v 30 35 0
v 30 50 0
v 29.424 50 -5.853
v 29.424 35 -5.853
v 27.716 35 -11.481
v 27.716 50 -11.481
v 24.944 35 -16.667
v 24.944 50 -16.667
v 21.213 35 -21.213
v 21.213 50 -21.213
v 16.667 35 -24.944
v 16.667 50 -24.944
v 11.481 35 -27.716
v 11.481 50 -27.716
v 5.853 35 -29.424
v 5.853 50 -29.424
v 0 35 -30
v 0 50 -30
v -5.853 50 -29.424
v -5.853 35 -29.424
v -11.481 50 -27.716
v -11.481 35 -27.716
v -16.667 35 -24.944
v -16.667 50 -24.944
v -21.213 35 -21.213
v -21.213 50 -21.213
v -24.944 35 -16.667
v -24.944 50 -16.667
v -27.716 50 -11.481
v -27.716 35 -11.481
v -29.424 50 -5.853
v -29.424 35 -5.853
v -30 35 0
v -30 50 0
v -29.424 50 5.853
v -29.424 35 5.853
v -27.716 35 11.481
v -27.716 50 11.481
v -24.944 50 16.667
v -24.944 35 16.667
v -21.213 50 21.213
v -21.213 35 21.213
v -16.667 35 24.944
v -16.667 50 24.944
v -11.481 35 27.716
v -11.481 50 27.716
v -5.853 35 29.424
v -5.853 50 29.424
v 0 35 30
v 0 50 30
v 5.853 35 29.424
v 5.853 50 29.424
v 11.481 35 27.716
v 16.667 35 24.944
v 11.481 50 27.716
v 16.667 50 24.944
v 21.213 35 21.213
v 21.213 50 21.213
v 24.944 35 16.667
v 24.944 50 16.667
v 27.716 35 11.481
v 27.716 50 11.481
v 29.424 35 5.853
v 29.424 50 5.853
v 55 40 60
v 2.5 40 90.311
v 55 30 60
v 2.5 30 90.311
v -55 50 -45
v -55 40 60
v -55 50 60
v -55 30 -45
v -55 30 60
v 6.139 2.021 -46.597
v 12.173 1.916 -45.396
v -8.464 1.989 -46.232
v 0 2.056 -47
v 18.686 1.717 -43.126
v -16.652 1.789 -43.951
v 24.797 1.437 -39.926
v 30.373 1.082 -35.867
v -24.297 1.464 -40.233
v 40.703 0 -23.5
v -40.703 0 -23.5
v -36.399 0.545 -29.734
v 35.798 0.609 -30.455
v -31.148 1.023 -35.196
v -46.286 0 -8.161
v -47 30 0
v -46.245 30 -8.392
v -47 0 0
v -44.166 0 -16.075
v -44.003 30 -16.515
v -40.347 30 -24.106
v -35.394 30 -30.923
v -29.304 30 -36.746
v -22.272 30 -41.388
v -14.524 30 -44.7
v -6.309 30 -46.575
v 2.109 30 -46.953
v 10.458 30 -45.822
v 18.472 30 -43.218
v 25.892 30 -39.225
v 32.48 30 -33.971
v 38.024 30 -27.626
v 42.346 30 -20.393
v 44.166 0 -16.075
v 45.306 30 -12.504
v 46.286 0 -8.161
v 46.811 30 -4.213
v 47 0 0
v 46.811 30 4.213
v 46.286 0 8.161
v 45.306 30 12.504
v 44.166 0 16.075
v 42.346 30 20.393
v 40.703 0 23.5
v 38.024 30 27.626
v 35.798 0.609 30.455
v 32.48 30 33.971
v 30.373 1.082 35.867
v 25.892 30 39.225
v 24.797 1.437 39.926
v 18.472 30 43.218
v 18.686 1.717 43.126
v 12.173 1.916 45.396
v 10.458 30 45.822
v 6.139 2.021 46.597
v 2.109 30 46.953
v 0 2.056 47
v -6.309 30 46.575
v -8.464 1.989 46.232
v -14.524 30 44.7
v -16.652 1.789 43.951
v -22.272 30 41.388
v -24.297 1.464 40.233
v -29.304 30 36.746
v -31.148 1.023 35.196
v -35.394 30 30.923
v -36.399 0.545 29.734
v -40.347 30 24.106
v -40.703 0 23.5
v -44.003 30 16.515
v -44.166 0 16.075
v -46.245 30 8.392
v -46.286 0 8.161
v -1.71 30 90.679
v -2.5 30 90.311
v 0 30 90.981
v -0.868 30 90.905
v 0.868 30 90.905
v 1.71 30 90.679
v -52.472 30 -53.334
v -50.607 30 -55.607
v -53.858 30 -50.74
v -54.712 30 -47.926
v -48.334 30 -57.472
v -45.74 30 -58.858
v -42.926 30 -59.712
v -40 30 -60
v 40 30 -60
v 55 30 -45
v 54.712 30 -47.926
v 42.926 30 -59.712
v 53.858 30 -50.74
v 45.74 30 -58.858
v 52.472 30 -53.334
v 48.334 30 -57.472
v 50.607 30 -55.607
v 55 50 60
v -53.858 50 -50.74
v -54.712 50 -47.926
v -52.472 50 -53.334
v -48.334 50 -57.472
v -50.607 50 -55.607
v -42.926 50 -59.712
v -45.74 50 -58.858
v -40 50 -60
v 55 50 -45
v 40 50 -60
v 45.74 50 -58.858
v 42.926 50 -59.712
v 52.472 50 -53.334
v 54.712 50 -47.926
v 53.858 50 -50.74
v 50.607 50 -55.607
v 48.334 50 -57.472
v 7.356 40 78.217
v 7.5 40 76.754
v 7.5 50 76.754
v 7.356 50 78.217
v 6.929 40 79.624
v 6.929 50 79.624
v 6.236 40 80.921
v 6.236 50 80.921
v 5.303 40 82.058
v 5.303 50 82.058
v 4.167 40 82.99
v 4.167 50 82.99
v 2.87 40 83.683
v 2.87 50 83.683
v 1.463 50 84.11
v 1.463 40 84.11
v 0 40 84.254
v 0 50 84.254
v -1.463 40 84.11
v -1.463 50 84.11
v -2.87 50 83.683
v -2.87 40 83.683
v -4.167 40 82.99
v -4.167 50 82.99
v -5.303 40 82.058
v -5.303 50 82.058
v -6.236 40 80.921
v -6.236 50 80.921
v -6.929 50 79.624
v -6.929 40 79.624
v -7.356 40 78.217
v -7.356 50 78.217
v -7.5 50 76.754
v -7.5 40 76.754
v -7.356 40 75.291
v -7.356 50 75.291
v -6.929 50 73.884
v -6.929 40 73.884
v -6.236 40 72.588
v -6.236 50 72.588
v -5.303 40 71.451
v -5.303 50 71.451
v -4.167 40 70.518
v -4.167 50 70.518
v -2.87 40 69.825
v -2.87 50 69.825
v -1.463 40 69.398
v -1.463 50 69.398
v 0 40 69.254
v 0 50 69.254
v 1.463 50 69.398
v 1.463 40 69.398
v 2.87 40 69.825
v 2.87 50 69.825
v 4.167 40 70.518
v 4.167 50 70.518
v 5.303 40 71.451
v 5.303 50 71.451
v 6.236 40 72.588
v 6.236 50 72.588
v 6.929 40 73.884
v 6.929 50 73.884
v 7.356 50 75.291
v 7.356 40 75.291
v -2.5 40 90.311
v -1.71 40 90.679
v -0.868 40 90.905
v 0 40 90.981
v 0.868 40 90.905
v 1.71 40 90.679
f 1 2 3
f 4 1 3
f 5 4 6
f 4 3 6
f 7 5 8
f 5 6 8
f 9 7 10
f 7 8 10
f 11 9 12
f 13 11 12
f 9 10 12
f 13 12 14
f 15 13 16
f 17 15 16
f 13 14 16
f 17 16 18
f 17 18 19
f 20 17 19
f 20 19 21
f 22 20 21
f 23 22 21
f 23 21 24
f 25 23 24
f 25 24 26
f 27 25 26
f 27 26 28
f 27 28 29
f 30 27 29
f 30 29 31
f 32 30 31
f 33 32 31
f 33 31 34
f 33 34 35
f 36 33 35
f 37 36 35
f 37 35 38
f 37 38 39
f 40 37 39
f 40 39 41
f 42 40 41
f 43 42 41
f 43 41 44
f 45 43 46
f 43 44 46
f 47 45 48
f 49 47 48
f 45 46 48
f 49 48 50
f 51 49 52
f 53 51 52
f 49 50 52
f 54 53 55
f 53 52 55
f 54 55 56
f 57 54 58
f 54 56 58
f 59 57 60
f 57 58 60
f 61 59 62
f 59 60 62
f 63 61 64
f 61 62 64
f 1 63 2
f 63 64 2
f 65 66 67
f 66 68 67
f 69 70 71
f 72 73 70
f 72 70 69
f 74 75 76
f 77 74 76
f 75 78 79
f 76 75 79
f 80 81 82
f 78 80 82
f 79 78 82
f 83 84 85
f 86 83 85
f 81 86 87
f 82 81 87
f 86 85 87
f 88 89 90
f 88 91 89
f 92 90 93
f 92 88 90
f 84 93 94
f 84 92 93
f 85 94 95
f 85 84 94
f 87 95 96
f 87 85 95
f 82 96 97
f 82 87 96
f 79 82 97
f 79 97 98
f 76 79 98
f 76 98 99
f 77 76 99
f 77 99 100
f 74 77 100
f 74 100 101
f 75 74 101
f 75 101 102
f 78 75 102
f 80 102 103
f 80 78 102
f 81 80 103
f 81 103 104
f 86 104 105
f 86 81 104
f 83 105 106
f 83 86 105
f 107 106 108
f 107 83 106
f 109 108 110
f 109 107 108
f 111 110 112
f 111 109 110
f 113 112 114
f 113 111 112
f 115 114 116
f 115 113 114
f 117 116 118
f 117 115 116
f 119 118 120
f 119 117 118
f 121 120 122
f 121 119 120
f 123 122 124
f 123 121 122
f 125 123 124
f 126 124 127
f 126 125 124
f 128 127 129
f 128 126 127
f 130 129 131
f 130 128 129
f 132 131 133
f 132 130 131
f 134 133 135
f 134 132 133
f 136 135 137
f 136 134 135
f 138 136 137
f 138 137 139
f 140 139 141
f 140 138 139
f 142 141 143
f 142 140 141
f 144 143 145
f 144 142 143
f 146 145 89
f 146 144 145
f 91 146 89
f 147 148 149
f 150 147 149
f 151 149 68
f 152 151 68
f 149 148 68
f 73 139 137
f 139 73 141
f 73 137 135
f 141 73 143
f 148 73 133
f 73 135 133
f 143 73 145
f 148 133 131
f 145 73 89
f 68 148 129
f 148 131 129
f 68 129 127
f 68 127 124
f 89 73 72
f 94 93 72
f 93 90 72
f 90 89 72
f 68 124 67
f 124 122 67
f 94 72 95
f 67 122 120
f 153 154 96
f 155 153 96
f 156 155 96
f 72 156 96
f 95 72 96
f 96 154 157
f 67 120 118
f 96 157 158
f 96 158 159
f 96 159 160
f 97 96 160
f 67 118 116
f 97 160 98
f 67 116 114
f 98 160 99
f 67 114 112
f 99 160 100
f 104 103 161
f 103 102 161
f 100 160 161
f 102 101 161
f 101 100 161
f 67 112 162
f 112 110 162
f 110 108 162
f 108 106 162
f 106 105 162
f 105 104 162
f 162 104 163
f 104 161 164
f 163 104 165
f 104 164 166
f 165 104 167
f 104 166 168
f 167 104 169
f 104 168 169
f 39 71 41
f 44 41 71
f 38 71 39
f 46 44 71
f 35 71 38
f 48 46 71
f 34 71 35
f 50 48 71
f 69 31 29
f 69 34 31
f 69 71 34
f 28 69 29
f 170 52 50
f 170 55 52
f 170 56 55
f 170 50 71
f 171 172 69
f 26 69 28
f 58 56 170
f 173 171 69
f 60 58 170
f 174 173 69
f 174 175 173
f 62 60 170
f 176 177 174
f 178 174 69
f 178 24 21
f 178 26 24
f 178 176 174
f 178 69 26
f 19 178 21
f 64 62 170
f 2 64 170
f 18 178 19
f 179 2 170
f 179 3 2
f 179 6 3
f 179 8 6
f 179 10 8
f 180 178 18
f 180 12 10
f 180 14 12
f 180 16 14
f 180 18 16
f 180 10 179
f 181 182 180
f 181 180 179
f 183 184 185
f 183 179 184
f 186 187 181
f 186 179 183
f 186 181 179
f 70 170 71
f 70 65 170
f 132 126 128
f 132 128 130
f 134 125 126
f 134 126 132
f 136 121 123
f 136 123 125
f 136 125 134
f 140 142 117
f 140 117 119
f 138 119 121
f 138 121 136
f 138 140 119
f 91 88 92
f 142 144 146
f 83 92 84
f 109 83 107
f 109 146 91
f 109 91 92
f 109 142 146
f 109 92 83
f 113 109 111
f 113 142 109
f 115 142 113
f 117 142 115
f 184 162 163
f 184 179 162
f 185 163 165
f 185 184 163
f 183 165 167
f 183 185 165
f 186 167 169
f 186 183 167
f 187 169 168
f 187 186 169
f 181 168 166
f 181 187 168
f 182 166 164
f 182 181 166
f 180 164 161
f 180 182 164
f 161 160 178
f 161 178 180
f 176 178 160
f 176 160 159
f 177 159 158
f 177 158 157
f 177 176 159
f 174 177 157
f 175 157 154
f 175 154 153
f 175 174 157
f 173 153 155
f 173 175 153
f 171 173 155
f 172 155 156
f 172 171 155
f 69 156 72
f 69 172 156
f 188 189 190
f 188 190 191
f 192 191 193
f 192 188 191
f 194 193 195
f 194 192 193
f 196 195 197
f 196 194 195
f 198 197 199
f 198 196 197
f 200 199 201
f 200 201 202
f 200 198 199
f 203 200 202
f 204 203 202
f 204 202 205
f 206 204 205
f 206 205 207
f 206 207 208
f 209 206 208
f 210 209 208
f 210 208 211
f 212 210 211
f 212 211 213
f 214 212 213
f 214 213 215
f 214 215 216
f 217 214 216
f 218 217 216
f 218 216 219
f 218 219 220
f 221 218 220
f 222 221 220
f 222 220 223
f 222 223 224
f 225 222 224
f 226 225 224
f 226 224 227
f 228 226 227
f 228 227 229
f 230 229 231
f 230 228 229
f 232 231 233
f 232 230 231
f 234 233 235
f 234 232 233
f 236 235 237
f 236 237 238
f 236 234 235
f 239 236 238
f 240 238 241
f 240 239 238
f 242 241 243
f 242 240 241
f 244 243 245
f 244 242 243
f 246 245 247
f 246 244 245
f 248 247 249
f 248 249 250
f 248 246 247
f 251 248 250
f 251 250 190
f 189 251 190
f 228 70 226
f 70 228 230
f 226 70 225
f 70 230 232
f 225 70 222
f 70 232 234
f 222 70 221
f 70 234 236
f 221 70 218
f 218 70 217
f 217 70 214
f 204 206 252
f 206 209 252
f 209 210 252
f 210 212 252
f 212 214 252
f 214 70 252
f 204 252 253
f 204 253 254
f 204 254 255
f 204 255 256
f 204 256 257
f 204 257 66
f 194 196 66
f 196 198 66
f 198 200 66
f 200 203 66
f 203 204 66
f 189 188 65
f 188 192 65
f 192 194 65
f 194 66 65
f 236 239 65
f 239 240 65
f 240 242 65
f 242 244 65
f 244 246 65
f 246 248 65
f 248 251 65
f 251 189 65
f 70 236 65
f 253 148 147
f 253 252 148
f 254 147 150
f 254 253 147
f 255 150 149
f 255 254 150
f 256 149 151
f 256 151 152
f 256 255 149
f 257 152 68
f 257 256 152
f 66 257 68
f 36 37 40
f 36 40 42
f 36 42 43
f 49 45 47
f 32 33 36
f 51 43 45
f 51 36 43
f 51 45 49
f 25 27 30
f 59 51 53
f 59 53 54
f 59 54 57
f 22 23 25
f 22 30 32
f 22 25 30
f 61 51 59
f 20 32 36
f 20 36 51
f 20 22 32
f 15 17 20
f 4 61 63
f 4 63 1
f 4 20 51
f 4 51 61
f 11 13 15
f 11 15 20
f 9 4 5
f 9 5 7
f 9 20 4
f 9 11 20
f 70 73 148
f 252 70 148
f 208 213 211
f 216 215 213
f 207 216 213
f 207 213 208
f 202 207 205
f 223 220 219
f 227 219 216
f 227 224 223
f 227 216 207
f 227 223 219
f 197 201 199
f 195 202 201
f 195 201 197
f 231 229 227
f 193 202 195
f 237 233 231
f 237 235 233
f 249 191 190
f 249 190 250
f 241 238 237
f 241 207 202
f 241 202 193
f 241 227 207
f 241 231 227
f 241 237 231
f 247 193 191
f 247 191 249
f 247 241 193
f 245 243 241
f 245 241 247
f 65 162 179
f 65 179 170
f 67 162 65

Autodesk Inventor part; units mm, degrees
ref_plane "YZ Plane" through (0, 0, 0) normal (1, 0, 0) x (0, 1, 0)
ref_plane "XZ Plane" through (0, 0, 0) normal (0, 1, 0) x (-1, 0, 0)
sketch "스케치1" plane through (0, 0, 0) normal (0, 1, 0) x (-1, 0, 0)
  circle A0 centre (0, 0) radius 47
  circle A1 centre (0, 0) radius 35
  line L0 (0, 0) -> (0, 145.5)
  circle A2 centre (0, 145.5) radius 48.5
  circle A3 centre (0, 145.5) radius 36.5
  dimension "d0" = 94
  dimension "d1" = 12
  dimension "d2" = 145.5
  dimension "d3" = 97
  dimension "d4" = 12
extrude "돌출1" add sketch "스케치1" along normal blind 30 contours A0
sketch "스케치2" plane through (0, 30, 0) normal (0, 1, 0) x (1, 0, 0)
  line L0 (-55, 60) -> (55, 60)
  line L1 (55, 60) -> (55, -60)
  line L2 (55, -60) -> (-55, -60)
  line L3 (-55, -60) -> (-55, 60)
  line L4 (-55, 60) -> (55, -60) construction
  line L5 (55, 60) -> (-55, -60) construction
  point P0 (0, 0)
  dimension "d7" = 110
  dimension "d8" = 120
extrude "돌출2" add sketch "스케치2" along normal blind 20
sketch "스케치3" plane through (0, 30, 0) normal (0, -1, 0) x (1, 0, 0)
  line L0 (-55, 60) -> (55, 60) projected
  line L1 (-55, 60) -> (0, 91.7543)
  line L2 (-55, 60) -> (8.5085, 60) construction
  line L3 (0, 91.7543) -> (55, 60)
  line L4 (55, 60) -> (-55, 60)
  line L5 (0, 91.7543) -> (0, 76.7543)
  circle A0 centre (0, 76.7543) radius 7.5
  point P0 (0, 0)
  dimension "d11" = 30
  dimension "d12" = 15
  dimension "d13" = 15
  dimension "d20" = 30
extrude "돌출3" add sketch "스케치3" against normal blind 10 contours L1 L3 L0 | A0
sketch "스케치4" plane through (0, 40, 0) normal (0, 1, 0) x (1, 0, 0)
  line L0 (55, -60) -> (0, -91.7543) projected
  line L1 (0, -91.7543) -> (0, -76.7543)
  circle A0 centre (0, -76.7543) radius 7.5
  point P0 (0, 0)
  dimension "d16" = 15
  dimension "d17" = 15
extrude "돌출4" add sketch "스케치4" along normal blind 10
fillet "모깎기1" radius 15 2 edges at (-55, 40, -60) (55, 40, -60)
ref_plane "작업 평면1" through (0, 50, 0) normal (0, 1, 0) x (1, 0, 0)
sketch "스케치6" plane through (0, 50, 0) normal (0, 1, 0) x (1, 0, 0)
  circle A0 centre (0, 0) radius 30
extrude "돌출6" cut sketch "스케치6" against normal blind 15
fillet "모깎기2" radius 5 1 edges at (0, 35, 91.7543)
sketch "스케치7" plane through (0, 0, 0) normal (0, -1, 0) x (1, 0, 0)
  circle A0 centre (0, 0) radius 35
extrude "돌출7" add sketch "스케치7" against normal up to surface (30 mm away)
sketch "스케치8" plane through (0, 0, 0) normal (1, 0, 0) x (0, 1, 0)
  line L0 (0, -47) -> (0, 47) projected
  line L1 (0, 0) -> (0, 47)
  line L2 (0, 23.5) -> (2.056, 47)
  line L3 (0, 47) -> (30, 47) projected
  line L4 (0, 23.5) -> (23.5898, 23.5) construction
  line L5 (2.056, 47) -> (0, 47)
  line L6 (0, 0) -> (0, -47)
  line L7 (0, -23.5) -> (0, -47)
  line L8 (0, -47) -> (30, -47) projected
  line L9 (0, -47) -> (0, -47)
  line L10 (0, -23.5) -> (0, -47)
  line L11 (0, -47) -> (0, -47)
  line L12 (0, -23.5) -> (2.056, -47)
  line L13 (0, -23.5) -> (23.5898, -23.5) construction
  line L14 (2.056, -47) -> (0, -47)
  dimension "d31" = 85
  dimension "d32" = 85
extrude "돌출8" cut sketch "스케치8" along normal mid plane 100
properties part number "bracket_1"
